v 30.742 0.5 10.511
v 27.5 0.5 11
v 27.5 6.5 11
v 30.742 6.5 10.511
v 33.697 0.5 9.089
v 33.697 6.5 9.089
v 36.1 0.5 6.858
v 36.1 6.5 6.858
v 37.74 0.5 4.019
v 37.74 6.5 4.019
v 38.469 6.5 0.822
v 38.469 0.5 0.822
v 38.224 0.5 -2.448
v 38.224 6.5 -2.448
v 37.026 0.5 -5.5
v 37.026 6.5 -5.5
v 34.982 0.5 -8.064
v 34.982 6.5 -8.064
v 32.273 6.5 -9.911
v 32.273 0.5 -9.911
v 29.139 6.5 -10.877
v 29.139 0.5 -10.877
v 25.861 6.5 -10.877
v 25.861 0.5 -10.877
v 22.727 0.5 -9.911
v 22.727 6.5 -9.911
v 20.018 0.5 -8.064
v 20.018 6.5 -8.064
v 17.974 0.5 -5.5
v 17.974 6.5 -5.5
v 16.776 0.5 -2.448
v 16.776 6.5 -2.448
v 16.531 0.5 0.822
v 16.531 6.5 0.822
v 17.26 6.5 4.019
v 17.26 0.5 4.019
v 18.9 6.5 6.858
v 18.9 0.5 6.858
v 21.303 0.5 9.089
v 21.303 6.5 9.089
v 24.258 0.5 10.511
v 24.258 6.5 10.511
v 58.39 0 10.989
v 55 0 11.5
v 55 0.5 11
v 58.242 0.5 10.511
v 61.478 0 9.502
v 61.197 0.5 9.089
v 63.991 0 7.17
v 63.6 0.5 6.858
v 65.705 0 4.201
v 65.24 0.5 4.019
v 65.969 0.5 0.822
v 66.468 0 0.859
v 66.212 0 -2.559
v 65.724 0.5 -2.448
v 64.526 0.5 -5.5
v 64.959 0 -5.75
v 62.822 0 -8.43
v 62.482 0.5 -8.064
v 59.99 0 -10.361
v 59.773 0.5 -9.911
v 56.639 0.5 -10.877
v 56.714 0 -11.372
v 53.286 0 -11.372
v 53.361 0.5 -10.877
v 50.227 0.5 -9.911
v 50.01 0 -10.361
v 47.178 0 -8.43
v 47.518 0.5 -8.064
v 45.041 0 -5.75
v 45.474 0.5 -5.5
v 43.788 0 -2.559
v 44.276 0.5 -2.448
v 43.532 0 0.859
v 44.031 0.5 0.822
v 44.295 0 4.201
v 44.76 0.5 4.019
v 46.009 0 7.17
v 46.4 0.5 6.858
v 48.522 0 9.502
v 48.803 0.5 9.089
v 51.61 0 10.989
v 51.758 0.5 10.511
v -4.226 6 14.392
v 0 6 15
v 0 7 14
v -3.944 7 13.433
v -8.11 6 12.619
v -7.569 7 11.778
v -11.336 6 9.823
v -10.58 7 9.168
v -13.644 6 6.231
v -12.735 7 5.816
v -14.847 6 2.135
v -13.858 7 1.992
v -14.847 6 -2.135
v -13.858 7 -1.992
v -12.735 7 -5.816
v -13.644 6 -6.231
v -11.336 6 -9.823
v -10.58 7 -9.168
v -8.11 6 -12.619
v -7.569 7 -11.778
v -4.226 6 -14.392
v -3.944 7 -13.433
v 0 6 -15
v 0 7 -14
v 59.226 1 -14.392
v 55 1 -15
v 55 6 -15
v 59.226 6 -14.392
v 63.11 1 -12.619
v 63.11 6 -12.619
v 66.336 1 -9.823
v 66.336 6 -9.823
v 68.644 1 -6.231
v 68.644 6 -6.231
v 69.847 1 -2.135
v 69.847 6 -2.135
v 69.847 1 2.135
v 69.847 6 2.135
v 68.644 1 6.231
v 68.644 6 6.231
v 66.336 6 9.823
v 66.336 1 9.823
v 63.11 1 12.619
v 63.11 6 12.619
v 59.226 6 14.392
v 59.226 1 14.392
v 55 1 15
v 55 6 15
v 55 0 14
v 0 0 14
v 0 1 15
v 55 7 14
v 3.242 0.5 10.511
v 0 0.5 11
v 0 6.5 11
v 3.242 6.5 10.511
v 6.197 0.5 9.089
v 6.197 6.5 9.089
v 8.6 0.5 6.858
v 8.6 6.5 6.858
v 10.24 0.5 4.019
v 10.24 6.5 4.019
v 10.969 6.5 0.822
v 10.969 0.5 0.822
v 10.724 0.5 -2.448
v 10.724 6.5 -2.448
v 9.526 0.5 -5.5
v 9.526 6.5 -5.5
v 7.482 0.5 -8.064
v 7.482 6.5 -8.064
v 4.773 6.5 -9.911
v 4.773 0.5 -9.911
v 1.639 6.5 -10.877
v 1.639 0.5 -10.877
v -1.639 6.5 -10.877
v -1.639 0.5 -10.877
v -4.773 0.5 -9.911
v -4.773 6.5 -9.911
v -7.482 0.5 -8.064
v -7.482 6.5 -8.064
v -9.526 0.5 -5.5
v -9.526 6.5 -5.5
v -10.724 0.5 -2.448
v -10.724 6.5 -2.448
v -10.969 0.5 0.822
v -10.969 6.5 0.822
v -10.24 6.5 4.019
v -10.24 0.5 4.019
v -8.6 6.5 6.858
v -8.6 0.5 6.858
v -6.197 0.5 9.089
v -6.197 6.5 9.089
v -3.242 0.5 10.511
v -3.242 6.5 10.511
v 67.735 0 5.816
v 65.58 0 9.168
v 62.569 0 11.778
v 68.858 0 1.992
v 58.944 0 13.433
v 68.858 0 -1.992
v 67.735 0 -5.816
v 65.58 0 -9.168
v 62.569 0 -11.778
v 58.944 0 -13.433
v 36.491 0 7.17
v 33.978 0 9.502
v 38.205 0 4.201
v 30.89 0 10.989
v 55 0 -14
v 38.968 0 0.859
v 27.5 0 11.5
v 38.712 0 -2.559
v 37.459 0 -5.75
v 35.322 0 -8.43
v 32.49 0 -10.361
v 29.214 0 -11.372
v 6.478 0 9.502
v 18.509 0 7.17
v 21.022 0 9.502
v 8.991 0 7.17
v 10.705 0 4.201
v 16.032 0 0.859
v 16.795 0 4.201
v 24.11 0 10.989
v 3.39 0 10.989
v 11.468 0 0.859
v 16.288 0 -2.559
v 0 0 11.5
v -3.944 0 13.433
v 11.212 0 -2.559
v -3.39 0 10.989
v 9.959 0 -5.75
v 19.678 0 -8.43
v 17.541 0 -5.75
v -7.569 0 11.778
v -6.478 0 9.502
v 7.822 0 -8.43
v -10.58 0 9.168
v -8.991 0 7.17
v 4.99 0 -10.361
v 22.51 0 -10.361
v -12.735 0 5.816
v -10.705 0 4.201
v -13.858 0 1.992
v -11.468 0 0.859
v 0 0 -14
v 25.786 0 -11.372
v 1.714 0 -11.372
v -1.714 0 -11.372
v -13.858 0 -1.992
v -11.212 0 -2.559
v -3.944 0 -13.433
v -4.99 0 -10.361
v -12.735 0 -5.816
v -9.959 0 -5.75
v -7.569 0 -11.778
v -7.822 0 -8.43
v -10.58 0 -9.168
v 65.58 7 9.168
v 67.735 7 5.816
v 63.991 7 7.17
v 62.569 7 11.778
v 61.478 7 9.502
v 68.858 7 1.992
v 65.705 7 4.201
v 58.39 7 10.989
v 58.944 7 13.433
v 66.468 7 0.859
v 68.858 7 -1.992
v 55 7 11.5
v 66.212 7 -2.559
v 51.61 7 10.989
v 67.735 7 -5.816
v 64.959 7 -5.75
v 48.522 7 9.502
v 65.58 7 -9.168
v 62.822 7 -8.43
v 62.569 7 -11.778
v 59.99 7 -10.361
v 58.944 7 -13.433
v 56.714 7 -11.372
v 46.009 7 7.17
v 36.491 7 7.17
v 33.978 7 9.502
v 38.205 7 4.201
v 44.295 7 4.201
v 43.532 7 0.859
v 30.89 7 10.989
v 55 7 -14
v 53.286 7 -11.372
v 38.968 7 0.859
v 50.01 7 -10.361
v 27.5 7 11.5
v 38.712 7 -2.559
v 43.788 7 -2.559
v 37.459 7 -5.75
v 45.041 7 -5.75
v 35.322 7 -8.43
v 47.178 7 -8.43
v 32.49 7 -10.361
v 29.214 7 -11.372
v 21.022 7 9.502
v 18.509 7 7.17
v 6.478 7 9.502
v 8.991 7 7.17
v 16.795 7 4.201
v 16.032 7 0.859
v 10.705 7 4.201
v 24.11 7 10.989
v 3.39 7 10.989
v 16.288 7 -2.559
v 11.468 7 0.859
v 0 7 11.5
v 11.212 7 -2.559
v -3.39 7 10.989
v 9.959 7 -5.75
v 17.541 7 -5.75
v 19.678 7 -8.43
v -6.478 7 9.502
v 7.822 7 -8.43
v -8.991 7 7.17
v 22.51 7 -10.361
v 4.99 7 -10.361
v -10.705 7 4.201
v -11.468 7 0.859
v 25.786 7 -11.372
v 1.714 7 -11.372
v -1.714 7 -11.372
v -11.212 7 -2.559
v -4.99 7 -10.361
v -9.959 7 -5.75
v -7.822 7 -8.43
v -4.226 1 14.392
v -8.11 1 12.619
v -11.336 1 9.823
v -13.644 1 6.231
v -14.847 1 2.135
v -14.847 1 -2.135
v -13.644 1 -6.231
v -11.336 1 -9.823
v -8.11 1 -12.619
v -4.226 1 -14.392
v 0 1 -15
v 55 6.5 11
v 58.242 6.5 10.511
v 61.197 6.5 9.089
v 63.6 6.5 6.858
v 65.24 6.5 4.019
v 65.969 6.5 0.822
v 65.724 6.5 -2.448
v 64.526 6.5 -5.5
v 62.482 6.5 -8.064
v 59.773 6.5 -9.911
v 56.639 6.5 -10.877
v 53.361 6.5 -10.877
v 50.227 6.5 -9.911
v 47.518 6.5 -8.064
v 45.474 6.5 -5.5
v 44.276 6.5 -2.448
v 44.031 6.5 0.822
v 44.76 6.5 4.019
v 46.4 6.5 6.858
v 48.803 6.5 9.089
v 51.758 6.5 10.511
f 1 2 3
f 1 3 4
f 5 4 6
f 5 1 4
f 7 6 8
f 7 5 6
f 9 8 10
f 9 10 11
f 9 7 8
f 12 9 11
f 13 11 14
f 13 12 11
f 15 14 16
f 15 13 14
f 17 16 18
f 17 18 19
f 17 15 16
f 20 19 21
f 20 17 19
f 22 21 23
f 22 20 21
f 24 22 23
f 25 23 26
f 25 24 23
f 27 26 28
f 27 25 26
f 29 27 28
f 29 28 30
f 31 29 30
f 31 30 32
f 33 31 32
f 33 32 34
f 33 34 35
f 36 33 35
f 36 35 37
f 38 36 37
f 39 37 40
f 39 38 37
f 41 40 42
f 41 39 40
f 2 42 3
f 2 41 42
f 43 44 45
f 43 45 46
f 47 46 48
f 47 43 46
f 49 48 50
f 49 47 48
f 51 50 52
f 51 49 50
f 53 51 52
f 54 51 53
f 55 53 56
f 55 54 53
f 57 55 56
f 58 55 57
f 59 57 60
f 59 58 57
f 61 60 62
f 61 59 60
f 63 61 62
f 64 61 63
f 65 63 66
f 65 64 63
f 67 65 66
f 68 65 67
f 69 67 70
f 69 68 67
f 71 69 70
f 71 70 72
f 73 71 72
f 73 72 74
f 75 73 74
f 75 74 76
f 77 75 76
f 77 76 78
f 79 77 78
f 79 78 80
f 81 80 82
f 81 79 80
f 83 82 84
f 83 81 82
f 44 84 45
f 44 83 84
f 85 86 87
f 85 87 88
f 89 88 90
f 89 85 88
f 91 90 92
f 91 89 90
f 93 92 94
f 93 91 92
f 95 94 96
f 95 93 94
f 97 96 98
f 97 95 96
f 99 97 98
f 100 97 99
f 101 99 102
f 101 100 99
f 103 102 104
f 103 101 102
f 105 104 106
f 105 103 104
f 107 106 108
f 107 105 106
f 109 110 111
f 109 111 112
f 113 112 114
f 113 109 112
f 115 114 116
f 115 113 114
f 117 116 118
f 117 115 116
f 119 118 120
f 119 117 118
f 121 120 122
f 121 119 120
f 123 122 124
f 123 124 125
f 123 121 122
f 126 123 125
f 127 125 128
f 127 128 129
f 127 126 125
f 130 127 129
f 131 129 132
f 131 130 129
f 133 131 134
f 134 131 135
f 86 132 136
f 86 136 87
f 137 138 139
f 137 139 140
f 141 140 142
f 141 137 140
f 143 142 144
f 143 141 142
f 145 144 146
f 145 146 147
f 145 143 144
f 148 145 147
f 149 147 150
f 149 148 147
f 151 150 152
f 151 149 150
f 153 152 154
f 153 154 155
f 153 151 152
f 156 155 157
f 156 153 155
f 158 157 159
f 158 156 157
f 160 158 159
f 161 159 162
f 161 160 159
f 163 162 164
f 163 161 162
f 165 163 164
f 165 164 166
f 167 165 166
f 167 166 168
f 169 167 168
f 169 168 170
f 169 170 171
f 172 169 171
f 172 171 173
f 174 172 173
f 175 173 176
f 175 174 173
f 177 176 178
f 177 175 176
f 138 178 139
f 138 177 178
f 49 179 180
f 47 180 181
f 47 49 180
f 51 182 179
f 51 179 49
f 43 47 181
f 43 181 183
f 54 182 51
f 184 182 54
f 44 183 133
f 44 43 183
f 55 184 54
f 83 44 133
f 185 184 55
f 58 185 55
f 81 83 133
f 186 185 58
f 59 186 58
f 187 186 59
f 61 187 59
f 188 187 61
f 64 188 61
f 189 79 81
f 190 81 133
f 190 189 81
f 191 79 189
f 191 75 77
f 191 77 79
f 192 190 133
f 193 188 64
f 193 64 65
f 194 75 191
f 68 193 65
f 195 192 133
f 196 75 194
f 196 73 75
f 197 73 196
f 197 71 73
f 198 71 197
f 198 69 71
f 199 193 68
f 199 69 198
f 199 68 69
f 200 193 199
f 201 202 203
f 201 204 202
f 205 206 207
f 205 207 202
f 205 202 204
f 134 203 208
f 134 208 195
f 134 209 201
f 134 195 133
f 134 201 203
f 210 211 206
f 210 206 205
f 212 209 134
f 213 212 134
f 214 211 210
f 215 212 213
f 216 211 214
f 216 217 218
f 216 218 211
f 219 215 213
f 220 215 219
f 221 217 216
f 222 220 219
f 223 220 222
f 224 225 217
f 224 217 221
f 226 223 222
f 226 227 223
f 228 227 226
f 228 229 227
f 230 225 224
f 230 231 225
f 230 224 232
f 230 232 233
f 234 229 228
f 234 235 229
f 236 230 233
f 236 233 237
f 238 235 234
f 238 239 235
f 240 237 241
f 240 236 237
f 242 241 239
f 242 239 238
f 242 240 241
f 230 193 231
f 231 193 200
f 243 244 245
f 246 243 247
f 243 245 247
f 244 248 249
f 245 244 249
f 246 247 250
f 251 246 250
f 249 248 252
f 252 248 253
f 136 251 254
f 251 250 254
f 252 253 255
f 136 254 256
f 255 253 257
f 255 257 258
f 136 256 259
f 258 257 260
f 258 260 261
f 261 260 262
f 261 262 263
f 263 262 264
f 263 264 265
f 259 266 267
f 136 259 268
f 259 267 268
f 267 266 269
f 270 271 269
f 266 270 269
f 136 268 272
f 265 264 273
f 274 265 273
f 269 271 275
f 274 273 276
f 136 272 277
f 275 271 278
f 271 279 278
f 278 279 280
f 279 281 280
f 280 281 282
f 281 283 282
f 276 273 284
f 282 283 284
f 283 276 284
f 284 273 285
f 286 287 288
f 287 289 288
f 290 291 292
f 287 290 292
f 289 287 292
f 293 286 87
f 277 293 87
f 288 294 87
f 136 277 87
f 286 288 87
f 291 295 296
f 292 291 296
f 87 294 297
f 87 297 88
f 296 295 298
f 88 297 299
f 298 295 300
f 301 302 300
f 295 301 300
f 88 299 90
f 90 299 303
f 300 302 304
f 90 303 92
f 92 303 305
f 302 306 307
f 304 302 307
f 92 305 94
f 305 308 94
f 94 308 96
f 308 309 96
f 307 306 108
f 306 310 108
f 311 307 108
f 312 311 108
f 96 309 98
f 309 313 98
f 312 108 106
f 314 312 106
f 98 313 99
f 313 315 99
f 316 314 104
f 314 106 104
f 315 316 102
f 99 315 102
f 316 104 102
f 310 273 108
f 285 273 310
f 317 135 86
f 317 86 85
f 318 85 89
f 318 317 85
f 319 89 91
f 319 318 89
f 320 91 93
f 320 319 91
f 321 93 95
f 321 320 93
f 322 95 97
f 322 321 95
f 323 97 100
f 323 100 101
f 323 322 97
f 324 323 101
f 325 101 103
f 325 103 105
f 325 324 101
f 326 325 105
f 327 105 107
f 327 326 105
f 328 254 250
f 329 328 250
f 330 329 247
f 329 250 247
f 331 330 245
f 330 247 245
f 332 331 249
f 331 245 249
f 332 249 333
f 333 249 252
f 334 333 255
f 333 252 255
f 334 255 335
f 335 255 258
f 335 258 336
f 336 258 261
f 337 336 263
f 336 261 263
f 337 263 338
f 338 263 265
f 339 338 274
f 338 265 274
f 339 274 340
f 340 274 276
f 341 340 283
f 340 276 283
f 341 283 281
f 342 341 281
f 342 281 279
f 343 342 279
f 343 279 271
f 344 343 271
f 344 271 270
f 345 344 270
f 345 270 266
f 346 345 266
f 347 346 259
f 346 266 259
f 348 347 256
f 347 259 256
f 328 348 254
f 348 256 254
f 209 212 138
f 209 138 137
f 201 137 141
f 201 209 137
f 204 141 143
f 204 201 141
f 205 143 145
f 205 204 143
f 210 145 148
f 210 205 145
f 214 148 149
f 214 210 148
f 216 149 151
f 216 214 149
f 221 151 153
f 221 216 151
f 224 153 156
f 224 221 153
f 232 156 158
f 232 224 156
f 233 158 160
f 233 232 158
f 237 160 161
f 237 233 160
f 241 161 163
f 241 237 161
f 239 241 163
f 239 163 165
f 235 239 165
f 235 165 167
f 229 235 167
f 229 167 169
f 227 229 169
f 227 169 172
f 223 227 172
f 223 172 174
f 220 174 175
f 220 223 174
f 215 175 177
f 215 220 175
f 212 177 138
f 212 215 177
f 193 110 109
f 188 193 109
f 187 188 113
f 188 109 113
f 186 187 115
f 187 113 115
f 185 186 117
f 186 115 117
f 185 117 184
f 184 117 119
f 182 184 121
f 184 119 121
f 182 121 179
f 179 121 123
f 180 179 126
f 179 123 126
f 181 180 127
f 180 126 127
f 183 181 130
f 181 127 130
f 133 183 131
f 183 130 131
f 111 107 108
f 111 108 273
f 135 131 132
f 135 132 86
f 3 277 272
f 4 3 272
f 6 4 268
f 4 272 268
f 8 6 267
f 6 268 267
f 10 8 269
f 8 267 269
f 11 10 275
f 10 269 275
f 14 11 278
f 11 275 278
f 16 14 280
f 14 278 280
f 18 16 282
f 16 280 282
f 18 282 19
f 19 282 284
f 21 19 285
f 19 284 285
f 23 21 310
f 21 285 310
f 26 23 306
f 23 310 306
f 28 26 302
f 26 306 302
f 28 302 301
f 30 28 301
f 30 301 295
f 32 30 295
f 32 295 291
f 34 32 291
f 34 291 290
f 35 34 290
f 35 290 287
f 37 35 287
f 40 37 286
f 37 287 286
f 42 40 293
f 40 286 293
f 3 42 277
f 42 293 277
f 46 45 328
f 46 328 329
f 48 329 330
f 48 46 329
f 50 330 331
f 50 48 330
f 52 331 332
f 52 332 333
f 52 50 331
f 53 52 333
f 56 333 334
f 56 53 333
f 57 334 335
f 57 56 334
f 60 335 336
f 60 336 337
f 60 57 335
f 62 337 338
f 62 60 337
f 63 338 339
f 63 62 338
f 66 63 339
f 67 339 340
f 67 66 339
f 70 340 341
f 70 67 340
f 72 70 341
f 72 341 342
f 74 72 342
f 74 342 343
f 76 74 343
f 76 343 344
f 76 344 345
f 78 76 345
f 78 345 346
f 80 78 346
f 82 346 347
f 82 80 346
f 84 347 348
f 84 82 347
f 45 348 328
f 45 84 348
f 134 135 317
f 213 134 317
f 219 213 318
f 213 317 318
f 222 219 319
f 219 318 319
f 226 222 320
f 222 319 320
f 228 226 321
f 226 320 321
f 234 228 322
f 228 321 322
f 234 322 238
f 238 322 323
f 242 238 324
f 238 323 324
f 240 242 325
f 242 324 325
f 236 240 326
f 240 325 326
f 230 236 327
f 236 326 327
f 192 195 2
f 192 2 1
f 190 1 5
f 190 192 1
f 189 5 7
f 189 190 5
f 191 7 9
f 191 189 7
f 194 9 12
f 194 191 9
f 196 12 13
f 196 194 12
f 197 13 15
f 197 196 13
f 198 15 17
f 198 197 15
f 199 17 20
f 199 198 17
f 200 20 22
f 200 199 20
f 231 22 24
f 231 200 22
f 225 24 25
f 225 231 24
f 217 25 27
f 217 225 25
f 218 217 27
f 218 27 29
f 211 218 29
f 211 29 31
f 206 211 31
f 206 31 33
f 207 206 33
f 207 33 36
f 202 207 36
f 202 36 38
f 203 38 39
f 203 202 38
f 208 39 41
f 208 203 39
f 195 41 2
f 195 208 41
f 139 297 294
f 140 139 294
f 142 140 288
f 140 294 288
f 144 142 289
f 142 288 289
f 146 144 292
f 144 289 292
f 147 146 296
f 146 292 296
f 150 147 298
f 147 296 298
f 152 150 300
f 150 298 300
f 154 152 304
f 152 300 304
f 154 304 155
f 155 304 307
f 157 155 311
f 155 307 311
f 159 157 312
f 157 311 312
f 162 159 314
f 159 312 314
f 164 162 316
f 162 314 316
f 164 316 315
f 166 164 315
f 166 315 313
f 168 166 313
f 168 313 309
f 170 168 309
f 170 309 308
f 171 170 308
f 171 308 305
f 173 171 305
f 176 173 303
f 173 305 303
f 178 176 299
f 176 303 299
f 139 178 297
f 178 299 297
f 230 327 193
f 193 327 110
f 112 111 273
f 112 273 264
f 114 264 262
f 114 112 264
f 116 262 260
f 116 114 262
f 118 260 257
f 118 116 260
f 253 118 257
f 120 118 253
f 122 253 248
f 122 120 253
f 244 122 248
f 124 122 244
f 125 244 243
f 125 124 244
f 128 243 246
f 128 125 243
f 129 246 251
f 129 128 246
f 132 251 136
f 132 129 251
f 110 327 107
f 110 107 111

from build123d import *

# Parameters (mm, degrees)
ESQUISSE1_R        = 11
BOSS_EXTRU_1_DEPTH = 7
CHANFREIN1_SIZE    = 0.5
CHANFREIN2_SIZE    = 1


with BuildPart() as part:
    # Esquisse1 → Boss.-Extru.1 (new body)
    with BuildSketch(Plane(origin=(0, 0, 0), x_dir=(1, 0, 0), z_dir=(0, 1, 0))):
        with BuildLine():
            Line((0, 15), (55, 15))
            ThreePointArc((55, 15), (70, 0), (55, -15))
            Line((55, -15), (0, -15))
            ThreePointArc((0, -15), (-15, 0), (0, 15))
        make_face()
        with Locations(Location((27.5, 0, 0), (0, 0, 270))):  # turned: the seam where the file's is
            Circle(ESQUISSE1_R, mode=Mode.SUBTRACT)
        with Locations(Location((0, 0, 0), (0, 0, 270))):  # turned: the seam where the file's is
            Circle(ESQUISSE1_R, mode=Mode.SUBTRACT)
        with Locations(Location((55, 0, 0), (0, 0, 270))):  # turned: the seam where the file's is
            Circle(ESQUISSE1_R, mode=Mode.SUBTRACT)
    extrude(amount=BOSS_EXTRU_1_DEPTH)

    # Chanfrein1
    chanfrein1_edges = [part.edges().sort_by_distance(p)[0] for p in [
        (27.5, 0, -11),
        (27.5, 7, -11),
        (0, 0, -11),
        (0, 7, -11),
        (55, 0, -11),
        (55, 7, -11),
    ]]
    chamfer(chanfrein1_edges, length=CHANFREIN1_SIZE)

    # Chanfrein2
    chanfrein2_edges = [part.edges().sort_by_distance(p)[0] for p in [
        (70, 7, 0),
        (27.5, 7, -15),
        (-15, 7, 0),
        (27.5, 0, -15),
        (70, 0, 0),
        (27.5, 0, 15),
        (-15, 0, 0),
        (27.5, 7, 15),
    ]]
    chamfer(chanfrein2_edges, length=CHANFREIN2_SIZE)


solid = part.part
